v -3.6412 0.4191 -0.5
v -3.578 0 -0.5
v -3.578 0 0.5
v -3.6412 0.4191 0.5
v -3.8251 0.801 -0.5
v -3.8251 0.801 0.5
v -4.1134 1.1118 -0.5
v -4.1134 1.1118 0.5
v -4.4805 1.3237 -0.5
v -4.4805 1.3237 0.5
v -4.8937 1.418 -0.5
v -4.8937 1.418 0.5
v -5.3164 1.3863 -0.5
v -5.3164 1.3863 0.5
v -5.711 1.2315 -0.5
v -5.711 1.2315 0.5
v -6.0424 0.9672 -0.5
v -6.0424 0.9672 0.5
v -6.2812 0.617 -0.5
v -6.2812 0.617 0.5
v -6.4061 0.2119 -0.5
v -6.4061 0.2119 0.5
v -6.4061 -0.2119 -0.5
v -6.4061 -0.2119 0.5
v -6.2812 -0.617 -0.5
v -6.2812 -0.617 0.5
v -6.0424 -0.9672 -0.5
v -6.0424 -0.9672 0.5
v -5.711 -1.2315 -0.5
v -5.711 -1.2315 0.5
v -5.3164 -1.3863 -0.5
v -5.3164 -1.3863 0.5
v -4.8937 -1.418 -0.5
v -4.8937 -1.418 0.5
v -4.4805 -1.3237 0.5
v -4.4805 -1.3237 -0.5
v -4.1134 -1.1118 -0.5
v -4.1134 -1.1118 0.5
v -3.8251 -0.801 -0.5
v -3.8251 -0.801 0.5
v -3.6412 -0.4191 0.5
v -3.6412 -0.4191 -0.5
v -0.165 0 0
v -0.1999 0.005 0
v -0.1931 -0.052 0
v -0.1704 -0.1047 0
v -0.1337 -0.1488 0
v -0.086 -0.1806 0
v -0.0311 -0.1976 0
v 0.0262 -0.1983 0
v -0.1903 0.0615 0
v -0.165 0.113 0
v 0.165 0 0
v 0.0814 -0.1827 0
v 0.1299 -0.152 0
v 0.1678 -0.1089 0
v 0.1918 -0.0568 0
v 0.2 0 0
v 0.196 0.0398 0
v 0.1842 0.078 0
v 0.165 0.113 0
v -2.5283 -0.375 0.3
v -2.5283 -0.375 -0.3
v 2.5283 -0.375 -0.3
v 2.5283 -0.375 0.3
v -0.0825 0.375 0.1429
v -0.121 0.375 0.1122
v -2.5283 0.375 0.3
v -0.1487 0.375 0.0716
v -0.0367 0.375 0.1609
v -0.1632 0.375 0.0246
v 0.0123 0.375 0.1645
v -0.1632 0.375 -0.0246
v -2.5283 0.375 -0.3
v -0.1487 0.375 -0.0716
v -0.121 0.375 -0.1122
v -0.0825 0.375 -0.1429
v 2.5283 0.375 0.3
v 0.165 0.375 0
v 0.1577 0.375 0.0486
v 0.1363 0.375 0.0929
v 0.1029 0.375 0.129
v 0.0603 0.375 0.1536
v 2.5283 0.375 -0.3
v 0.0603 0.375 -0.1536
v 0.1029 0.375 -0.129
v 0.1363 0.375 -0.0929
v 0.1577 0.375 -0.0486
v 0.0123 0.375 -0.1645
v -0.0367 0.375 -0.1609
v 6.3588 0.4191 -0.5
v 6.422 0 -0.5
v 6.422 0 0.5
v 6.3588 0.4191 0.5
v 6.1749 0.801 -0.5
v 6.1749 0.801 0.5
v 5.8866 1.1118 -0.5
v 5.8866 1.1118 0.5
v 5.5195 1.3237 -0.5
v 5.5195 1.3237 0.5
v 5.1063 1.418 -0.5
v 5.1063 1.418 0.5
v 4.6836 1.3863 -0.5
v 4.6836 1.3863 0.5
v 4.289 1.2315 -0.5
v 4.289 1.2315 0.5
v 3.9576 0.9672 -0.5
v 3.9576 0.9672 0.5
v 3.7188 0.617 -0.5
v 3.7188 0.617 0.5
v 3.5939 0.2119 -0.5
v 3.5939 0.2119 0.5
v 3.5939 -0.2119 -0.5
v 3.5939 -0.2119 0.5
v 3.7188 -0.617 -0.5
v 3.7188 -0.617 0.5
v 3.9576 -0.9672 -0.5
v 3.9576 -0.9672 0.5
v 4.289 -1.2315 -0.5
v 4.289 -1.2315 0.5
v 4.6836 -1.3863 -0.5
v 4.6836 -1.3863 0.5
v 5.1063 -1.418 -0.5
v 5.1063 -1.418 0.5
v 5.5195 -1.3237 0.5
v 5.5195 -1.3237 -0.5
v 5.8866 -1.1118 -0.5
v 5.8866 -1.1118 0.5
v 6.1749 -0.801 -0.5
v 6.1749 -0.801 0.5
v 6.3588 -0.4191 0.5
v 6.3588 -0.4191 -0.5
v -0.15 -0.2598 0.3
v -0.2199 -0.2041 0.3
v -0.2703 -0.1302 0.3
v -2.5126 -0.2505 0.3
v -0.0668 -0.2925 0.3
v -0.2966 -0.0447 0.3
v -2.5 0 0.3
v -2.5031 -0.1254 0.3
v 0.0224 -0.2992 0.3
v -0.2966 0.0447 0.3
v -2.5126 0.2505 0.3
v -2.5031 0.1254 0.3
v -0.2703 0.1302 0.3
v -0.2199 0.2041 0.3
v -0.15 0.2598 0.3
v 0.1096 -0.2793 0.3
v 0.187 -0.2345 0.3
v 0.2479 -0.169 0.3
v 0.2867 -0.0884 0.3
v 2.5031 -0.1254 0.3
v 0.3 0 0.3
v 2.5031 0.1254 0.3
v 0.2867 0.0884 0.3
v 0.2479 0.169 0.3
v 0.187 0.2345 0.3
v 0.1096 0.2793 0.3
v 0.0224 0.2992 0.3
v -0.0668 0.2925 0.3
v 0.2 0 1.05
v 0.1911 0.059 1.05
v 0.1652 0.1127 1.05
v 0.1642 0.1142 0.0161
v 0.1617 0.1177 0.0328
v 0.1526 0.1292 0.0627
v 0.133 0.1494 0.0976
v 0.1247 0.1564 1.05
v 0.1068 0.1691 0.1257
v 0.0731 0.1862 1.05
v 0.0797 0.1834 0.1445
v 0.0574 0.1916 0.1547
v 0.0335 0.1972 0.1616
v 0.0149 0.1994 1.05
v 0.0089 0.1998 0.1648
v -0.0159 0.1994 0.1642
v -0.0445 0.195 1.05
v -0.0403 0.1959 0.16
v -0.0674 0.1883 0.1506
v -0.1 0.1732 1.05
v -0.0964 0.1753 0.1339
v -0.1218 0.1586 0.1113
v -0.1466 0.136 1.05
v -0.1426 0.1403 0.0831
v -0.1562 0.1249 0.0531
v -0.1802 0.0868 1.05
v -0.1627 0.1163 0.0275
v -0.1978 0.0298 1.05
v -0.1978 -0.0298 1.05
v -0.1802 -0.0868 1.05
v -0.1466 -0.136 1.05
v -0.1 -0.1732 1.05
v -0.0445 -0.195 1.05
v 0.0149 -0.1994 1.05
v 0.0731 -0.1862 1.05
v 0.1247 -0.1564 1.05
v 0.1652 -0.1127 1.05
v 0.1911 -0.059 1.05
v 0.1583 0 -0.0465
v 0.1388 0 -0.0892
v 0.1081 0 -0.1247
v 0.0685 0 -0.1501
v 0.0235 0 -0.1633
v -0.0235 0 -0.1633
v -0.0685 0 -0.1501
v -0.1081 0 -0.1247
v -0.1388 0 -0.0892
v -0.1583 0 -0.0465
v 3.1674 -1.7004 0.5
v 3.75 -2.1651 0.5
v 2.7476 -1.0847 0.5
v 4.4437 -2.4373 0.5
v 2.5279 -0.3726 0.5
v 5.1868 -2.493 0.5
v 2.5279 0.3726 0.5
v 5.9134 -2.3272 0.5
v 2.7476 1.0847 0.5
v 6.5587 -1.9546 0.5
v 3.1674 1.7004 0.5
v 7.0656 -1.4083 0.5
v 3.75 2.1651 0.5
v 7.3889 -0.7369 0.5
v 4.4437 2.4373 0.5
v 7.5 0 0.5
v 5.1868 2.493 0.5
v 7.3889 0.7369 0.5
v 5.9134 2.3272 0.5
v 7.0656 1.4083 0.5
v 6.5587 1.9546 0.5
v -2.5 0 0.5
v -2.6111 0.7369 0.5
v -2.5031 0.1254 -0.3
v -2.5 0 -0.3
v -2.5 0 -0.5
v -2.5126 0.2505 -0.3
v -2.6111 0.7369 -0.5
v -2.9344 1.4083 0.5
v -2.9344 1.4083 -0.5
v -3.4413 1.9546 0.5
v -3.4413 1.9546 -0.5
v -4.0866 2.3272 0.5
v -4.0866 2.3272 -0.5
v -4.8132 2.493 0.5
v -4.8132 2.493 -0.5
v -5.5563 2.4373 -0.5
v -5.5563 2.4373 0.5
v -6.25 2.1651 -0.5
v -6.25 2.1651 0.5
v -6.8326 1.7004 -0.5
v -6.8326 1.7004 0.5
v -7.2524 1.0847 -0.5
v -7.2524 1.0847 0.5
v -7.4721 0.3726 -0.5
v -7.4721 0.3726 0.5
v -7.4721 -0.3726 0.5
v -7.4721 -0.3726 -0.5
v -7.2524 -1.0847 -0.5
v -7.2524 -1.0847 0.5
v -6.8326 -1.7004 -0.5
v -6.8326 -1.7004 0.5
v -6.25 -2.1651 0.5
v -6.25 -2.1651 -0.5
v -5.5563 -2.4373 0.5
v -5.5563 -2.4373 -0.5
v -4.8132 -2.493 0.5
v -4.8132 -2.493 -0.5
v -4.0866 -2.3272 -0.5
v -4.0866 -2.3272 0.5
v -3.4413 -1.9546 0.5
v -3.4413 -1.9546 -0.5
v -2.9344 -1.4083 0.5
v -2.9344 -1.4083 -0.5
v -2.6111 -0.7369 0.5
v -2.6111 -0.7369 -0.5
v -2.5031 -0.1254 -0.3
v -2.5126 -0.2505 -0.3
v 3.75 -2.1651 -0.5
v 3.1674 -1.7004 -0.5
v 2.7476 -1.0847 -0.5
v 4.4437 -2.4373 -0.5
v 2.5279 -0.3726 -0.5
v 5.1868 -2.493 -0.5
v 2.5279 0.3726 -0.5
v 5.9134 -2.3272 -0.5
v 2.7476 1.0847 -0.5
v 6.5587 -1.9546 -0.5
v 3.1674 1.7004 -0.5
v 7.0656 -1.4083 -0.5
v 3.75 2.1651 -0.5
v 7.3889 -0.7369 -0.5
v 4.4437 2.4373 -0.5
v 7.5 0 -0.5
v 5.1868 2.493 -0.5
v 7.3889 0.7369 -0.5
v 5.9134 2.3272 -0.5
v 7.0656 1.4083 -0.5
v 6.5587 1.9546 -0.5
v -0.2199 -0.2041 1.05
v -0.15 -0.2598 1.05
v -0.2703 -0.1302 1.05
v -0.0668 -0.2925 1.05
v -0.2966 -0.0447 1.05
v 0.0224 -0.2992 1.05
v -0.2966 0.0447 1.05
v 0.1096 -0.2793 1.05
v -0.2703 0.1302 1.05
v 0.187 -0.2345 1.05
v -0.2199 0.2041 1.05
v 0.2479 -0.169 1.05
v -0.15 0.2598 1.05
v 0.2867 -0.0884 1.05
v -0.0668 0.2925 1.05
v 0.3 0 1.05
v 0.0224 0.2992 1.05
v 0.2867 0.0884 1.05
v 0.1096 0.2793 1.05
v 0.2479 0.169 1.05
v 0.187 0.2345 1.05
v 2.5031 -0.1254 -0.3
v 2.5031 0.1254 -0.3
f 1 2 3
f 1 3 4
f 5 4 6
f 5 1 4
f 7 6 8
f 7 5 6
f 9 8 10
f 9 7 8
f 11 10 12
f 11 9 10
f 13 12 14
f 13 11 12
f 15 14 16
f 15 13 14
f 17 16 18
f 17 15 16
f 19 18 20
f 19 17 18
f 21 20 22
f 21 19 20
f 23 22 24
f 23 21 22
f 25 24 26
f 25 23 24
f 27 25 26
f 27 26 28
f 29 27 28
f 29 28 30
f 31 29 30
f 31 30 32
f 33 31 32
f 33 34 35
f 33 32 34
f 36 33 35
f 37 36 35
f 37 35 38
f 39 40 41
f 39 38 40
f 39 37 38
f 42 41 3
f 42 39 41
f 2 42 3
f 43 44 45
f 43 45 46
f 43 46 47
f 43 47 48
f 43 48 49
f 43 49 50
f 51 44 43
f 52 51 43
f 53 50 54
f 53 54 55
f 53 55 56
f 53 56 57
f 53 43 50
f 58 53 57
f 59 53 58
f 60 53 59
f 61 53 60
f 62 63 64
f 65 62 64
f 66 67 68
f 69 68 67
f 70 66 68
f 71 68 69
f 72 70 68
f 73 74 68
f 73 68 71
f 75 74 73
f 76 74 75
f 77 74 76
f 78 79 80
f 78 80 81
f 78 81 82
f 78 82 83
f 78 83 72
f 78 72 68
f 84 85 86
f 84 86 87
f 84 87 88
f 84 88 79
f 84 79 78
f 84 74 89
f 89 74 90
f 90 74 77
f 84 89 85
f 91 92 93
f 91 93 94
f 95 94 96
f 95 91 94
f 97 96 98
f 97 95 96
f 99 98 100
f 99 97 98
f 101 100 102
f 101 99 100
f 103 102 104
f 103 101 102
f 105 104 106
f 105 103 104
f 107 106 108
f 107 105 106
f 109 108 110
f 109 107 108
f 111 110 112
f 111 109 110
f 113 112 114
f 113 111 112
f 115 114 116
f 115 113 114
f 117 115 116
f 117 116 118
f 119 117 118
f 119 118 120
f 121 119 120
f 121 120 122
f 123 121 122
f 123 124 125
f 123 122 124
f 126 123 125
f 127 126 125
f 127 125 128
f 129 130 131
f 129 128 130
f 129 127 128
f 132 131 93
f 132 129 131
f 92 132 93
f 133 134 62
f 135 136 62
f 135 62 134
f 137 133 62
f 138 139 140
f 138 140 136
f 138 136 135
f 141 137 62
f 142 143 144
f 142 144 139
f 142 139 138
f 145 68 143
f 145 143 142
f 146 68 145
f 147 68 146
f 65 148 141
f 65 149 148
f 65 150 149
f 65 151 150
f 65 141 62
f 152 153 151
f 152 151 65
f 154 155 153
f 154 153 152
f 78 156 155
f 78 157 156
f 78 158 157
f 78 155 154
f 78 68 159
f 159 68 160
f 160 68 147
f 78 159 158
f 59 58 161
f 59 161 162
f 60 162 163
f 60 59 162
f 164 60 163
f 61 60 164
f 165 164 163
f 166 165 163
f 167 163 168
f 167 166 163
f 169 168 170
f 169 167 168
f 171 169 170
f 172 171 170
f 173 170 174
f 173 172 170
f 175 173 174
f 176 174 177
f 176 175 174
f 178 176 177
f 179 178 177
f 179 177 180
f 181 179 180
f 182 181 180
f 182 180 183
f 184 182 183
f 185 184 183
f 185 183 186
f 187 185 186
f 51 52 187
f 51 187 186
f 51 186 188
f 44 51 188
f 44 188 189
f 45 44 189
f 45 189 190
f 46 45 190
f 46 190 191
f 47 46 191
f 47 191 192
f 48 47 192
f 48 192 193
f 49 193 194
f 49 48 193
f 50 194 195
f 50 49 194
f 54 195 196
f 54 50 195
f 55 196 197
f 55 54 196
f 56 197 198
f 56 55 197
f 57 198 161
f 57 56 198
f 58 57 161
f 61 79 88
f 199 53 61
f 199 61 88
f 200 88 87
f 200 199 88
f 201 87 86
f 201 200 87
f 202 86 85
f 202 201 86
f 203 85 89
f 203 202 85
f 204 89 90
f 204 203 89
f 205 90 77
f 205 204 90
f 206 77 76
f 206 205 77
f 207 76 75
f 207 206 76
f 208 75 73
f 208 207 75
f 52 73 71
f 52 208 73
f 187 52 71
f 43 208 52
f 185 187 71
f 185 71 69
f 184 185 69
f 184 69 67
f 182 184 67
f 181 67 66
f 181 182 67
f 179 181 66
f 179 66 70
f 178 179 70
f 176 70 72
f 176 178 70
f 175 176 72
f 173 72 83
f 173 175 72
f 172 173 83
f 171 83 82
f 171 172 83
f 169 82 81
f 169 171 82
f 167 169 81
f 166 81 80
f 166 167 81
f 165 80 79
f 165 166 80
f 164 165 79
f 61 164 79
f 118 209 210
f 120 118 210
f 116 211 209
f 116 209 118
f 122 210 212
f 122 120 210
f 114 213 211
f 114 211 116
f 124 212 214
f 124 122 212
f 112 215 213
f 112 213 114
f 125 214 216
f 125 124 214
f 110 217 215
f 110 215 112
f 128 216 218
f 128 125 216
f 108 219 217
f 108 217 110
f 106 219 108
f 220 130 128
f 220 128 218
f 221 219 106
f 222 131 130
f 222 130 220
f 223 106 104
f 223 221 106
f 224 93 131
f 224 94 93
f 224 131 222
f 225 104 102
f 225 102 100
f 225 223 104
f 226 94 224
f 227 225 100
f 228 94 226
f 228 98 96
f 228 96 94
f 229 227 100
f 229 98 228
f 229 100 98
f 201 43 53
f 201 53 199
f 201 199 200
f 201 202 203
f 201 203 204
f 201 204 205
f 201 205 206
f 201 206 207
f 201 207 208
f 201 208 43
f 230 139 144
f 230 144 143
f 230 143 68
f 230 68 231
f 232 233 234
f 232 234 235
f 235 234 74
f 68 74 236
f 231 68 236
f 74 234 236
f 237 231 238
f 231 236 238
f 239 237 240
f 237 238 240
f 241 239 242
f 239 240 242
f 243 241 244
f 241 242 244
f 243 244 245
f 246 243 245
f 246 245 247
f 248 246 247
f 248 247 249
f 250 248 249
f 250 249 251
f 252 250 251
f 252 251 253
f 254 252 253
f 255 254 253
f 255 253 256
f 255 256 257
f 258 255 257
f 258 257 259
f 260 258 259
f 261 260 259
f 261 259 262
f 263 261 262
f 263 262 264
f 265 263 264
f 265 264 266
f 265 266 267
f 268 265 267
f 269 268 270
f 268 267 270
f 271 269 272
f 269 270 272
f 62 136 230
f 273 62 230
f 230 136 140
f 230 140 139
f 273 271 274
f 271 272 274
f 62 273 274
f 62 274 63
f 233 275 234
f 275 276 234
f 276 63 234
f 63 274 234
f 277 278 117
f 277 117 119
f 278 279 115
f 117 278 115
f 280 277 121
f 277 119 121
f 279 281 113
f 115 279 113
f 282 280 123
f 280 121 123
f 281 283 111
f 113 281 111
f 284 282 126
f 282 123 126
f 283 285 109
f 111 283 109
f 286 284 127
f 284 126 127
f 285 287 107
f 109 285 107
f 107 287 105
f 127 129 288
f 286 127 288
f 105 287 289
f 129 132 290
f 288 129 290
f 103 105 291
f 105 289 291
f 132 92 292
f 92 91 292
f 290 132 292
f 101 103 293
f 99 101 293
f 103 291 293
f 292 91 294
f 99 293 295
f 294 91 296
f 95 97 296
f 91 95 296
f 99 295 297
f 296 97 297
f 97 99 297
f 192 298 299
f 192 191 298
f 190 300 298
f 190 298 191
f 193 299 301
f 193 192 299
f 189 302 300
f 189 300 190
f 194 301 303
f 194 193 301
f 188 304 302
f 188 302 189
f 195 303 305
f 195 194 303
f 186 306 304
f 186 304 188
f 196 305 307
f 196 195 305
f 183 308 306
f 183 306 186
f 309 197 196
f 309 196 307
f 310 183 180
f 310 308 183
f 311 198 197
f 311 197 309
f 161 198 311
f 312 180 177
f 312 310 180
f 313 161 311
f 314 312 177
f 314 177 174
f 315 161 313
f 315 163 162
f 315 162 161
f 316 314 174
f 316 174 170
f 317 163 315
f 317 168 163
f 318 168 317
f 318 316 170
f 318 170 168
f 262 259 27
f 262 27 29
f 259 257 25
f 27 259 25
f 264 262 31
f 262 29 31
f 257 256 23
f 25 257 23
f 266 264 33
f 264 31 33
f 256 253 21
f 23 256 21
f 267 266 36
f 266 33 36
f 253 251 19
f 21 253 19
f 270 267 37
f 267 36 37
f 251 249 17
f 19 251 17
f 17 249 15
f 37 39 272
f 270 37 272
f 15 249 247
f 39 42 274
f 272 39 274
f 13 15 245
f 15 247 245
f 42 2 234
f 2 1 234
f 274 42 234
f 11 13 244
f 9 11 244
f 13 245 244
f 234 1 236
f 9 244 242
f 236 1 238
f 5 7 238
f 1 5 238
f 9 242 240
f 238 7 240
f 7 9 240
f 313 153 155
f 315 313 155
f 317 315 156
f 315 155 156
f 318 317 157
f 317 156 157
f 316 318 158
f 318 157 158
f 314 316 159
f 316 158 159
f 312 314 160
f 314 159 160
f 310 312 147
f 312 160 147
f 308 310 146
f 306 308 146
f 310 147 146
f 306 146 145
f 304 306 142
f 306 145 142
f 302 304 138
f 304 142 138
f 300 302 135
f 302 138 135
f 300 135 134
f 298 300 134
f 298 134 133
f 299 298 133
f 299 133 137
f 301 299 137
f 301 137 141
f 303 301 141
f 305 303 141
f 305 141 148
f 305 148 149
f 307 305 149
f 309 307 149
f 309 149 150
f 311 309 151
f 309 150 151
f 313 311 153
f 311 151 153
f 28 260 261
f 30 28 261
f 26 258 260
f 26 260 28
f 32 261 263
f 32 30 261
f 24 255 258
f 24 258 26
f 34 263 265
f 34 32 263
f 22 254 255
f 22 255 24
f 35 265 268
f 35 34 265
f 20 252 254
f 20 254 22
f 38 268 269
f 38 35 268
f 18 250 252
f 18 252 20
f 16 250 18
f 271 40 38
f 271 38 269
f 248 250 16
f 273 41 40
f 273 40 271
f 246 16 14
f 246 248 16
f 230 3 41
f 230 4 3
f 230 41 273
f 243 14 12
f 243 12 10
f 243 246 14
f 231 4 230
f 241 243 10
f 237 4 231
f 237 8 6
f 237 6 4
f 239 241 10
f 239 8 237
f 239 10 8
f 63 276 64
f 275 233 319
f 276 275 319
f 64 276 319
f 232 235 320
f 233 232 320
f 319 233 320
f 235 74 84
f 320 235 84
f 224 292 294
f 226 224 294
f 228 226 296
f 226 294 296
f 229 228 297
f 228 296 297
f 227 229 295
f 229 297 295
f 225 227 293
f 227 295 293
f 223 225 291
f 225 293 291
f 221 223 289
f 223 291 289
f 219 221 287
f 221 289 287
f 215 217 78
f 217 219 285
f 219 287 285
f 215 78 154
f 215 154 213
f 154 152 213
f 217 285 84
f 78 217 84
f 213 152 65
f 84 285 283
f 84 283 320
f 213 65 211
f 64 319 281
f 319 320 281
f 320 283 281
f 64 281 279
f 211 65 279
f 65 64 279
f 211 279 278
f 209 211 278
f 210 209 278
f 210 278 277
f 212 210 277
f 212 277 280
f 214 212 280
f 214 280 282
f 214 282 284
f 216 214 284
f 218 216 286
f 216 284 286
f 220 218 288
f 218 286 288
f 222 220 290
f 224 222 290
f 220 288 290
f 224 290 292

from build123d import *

# Parameters (mm, degrees)
CYLINDER136_R     = 0.2
CYLINDER136_DEPTH = 9
CYLINDER_R        = 1.422
CYLINDER_DEPTH    = 2
CYLINDER139_R     = 1.422
CYLINDER139_DEPTH = 2
CYLINDER138_R     = 0.165
CYLINDER138_DEPTH = 8
CYLINDER142_R     = 2.5
CYLINDER142_DEPTH = 1
CYLINDER141_R     = 2.5
CYLINDER141_DEPTH = 1
CYLINDER140_R     = 0.3
CYLINDER140_DEPTH = 0.75
BOX_W             = 10
BOX_H             = 0.75
BOX_DEPTH         = 0.6


with BuildPart() as bowtienozzle:
    # Cylinder136 → Cylinder136 (new body)
    with BuildSketch(Plane.XY):
        Circle(CYLINDER136_R)
    extrude(amount=CYLINDER136_DEPTH)


with BuildPart() as mountinghole1:
    # Cylinder → Cylinder (new body)
    with BuildSketch(Plane(origin=(-5, 0, -1), x_dir=(1, 0, 0), z_dir=(0, 0, 1))):
        Circle(CYLINDER_R)
    extrude(amount=CYLINDER_DEPTH)


with BuildPart() as mountinghole2:
    # Cylinder139 → Cylinder139 (new body)
    with BuildSketch(Plane(origin=(5, 0, -1), x_dir=(1, 0, 0), z_dir=(0, 0, 1))):
        Circle(CYLINDER139_R)
    extrude(amount=CYLINDER139_DEPTH)


with BuildPart() as fusion001:
    # Cylinder138 → Cylinder138 (new body)
    with BuildSketch(Plane(origin=(0, 0, 0), x_dir=(1, 0, 0), z_dir=(0, 1, 0))):
        Circle(CYLINDER138_R)
    extrude(amount=CYLINDER138_DEPTH)

    # Fusion001: union BowTieNozzle, MountingHole1, MountingHole2
    add(bowtienozzle.part)
    add(mountinghole1.part)
    add(mountinghole2.part)


with BuildPart() as mountingholeod001:
    # Cylinder142 → Cylinder142 (new body)
    with BuildSketch(Plane(origin=(5, 0, -0.5), x_dir=(1, 0, 0), z_dir=(0, 0, 1))):
        Circle(CYLINDER142_R)
    extrude(amount=CYLINDER142_DEPTH)


with BuildPart() as mountingholeod:
    # Cylinder141 → Cylinder141 (new body)
    with BuildSketch(Plane(origin=(-5, 0, -0.5), x_dir=(1, 0, 0), z_dir=(0, 0, 1))):
        Circle(CYLINDER141_R)
    extrude(amount=CYLINDER141_DEPTH)


with BuildPart() as nozzle_od:
    # Cylinder140 → Cylinder140 (new body)
    with BuildSketch(Plane.XY.offset(0.3)):
        Circle(CYLINDER140_R)
    extrude(amount=CYLINDER140_DEPTH)


with BuildPart() as cut:
    # Box → Box (new body)
    with BuildSketch(Plane(origin=(-5, -0.375, -0.3), x_dir=(1, 0, 0), z_dir=(0, 0, 1))):
        with Locations((5, 0.375)):
            Rectangle(BOX_W, BOX_H)
    extrude(amount=BOX_DEPTH)

    # Fusion: union MountingHoleOD001, MountingHoleOD, Nozzle_OD
    add(mountingholeod001.part)
    add(mountingholeod.part)
    add(nozzle_od.part)

    # Cut: cut Fusion001
    add(fusion001.part, mode=Mode.SUBTRACT)


solid = cut.part
